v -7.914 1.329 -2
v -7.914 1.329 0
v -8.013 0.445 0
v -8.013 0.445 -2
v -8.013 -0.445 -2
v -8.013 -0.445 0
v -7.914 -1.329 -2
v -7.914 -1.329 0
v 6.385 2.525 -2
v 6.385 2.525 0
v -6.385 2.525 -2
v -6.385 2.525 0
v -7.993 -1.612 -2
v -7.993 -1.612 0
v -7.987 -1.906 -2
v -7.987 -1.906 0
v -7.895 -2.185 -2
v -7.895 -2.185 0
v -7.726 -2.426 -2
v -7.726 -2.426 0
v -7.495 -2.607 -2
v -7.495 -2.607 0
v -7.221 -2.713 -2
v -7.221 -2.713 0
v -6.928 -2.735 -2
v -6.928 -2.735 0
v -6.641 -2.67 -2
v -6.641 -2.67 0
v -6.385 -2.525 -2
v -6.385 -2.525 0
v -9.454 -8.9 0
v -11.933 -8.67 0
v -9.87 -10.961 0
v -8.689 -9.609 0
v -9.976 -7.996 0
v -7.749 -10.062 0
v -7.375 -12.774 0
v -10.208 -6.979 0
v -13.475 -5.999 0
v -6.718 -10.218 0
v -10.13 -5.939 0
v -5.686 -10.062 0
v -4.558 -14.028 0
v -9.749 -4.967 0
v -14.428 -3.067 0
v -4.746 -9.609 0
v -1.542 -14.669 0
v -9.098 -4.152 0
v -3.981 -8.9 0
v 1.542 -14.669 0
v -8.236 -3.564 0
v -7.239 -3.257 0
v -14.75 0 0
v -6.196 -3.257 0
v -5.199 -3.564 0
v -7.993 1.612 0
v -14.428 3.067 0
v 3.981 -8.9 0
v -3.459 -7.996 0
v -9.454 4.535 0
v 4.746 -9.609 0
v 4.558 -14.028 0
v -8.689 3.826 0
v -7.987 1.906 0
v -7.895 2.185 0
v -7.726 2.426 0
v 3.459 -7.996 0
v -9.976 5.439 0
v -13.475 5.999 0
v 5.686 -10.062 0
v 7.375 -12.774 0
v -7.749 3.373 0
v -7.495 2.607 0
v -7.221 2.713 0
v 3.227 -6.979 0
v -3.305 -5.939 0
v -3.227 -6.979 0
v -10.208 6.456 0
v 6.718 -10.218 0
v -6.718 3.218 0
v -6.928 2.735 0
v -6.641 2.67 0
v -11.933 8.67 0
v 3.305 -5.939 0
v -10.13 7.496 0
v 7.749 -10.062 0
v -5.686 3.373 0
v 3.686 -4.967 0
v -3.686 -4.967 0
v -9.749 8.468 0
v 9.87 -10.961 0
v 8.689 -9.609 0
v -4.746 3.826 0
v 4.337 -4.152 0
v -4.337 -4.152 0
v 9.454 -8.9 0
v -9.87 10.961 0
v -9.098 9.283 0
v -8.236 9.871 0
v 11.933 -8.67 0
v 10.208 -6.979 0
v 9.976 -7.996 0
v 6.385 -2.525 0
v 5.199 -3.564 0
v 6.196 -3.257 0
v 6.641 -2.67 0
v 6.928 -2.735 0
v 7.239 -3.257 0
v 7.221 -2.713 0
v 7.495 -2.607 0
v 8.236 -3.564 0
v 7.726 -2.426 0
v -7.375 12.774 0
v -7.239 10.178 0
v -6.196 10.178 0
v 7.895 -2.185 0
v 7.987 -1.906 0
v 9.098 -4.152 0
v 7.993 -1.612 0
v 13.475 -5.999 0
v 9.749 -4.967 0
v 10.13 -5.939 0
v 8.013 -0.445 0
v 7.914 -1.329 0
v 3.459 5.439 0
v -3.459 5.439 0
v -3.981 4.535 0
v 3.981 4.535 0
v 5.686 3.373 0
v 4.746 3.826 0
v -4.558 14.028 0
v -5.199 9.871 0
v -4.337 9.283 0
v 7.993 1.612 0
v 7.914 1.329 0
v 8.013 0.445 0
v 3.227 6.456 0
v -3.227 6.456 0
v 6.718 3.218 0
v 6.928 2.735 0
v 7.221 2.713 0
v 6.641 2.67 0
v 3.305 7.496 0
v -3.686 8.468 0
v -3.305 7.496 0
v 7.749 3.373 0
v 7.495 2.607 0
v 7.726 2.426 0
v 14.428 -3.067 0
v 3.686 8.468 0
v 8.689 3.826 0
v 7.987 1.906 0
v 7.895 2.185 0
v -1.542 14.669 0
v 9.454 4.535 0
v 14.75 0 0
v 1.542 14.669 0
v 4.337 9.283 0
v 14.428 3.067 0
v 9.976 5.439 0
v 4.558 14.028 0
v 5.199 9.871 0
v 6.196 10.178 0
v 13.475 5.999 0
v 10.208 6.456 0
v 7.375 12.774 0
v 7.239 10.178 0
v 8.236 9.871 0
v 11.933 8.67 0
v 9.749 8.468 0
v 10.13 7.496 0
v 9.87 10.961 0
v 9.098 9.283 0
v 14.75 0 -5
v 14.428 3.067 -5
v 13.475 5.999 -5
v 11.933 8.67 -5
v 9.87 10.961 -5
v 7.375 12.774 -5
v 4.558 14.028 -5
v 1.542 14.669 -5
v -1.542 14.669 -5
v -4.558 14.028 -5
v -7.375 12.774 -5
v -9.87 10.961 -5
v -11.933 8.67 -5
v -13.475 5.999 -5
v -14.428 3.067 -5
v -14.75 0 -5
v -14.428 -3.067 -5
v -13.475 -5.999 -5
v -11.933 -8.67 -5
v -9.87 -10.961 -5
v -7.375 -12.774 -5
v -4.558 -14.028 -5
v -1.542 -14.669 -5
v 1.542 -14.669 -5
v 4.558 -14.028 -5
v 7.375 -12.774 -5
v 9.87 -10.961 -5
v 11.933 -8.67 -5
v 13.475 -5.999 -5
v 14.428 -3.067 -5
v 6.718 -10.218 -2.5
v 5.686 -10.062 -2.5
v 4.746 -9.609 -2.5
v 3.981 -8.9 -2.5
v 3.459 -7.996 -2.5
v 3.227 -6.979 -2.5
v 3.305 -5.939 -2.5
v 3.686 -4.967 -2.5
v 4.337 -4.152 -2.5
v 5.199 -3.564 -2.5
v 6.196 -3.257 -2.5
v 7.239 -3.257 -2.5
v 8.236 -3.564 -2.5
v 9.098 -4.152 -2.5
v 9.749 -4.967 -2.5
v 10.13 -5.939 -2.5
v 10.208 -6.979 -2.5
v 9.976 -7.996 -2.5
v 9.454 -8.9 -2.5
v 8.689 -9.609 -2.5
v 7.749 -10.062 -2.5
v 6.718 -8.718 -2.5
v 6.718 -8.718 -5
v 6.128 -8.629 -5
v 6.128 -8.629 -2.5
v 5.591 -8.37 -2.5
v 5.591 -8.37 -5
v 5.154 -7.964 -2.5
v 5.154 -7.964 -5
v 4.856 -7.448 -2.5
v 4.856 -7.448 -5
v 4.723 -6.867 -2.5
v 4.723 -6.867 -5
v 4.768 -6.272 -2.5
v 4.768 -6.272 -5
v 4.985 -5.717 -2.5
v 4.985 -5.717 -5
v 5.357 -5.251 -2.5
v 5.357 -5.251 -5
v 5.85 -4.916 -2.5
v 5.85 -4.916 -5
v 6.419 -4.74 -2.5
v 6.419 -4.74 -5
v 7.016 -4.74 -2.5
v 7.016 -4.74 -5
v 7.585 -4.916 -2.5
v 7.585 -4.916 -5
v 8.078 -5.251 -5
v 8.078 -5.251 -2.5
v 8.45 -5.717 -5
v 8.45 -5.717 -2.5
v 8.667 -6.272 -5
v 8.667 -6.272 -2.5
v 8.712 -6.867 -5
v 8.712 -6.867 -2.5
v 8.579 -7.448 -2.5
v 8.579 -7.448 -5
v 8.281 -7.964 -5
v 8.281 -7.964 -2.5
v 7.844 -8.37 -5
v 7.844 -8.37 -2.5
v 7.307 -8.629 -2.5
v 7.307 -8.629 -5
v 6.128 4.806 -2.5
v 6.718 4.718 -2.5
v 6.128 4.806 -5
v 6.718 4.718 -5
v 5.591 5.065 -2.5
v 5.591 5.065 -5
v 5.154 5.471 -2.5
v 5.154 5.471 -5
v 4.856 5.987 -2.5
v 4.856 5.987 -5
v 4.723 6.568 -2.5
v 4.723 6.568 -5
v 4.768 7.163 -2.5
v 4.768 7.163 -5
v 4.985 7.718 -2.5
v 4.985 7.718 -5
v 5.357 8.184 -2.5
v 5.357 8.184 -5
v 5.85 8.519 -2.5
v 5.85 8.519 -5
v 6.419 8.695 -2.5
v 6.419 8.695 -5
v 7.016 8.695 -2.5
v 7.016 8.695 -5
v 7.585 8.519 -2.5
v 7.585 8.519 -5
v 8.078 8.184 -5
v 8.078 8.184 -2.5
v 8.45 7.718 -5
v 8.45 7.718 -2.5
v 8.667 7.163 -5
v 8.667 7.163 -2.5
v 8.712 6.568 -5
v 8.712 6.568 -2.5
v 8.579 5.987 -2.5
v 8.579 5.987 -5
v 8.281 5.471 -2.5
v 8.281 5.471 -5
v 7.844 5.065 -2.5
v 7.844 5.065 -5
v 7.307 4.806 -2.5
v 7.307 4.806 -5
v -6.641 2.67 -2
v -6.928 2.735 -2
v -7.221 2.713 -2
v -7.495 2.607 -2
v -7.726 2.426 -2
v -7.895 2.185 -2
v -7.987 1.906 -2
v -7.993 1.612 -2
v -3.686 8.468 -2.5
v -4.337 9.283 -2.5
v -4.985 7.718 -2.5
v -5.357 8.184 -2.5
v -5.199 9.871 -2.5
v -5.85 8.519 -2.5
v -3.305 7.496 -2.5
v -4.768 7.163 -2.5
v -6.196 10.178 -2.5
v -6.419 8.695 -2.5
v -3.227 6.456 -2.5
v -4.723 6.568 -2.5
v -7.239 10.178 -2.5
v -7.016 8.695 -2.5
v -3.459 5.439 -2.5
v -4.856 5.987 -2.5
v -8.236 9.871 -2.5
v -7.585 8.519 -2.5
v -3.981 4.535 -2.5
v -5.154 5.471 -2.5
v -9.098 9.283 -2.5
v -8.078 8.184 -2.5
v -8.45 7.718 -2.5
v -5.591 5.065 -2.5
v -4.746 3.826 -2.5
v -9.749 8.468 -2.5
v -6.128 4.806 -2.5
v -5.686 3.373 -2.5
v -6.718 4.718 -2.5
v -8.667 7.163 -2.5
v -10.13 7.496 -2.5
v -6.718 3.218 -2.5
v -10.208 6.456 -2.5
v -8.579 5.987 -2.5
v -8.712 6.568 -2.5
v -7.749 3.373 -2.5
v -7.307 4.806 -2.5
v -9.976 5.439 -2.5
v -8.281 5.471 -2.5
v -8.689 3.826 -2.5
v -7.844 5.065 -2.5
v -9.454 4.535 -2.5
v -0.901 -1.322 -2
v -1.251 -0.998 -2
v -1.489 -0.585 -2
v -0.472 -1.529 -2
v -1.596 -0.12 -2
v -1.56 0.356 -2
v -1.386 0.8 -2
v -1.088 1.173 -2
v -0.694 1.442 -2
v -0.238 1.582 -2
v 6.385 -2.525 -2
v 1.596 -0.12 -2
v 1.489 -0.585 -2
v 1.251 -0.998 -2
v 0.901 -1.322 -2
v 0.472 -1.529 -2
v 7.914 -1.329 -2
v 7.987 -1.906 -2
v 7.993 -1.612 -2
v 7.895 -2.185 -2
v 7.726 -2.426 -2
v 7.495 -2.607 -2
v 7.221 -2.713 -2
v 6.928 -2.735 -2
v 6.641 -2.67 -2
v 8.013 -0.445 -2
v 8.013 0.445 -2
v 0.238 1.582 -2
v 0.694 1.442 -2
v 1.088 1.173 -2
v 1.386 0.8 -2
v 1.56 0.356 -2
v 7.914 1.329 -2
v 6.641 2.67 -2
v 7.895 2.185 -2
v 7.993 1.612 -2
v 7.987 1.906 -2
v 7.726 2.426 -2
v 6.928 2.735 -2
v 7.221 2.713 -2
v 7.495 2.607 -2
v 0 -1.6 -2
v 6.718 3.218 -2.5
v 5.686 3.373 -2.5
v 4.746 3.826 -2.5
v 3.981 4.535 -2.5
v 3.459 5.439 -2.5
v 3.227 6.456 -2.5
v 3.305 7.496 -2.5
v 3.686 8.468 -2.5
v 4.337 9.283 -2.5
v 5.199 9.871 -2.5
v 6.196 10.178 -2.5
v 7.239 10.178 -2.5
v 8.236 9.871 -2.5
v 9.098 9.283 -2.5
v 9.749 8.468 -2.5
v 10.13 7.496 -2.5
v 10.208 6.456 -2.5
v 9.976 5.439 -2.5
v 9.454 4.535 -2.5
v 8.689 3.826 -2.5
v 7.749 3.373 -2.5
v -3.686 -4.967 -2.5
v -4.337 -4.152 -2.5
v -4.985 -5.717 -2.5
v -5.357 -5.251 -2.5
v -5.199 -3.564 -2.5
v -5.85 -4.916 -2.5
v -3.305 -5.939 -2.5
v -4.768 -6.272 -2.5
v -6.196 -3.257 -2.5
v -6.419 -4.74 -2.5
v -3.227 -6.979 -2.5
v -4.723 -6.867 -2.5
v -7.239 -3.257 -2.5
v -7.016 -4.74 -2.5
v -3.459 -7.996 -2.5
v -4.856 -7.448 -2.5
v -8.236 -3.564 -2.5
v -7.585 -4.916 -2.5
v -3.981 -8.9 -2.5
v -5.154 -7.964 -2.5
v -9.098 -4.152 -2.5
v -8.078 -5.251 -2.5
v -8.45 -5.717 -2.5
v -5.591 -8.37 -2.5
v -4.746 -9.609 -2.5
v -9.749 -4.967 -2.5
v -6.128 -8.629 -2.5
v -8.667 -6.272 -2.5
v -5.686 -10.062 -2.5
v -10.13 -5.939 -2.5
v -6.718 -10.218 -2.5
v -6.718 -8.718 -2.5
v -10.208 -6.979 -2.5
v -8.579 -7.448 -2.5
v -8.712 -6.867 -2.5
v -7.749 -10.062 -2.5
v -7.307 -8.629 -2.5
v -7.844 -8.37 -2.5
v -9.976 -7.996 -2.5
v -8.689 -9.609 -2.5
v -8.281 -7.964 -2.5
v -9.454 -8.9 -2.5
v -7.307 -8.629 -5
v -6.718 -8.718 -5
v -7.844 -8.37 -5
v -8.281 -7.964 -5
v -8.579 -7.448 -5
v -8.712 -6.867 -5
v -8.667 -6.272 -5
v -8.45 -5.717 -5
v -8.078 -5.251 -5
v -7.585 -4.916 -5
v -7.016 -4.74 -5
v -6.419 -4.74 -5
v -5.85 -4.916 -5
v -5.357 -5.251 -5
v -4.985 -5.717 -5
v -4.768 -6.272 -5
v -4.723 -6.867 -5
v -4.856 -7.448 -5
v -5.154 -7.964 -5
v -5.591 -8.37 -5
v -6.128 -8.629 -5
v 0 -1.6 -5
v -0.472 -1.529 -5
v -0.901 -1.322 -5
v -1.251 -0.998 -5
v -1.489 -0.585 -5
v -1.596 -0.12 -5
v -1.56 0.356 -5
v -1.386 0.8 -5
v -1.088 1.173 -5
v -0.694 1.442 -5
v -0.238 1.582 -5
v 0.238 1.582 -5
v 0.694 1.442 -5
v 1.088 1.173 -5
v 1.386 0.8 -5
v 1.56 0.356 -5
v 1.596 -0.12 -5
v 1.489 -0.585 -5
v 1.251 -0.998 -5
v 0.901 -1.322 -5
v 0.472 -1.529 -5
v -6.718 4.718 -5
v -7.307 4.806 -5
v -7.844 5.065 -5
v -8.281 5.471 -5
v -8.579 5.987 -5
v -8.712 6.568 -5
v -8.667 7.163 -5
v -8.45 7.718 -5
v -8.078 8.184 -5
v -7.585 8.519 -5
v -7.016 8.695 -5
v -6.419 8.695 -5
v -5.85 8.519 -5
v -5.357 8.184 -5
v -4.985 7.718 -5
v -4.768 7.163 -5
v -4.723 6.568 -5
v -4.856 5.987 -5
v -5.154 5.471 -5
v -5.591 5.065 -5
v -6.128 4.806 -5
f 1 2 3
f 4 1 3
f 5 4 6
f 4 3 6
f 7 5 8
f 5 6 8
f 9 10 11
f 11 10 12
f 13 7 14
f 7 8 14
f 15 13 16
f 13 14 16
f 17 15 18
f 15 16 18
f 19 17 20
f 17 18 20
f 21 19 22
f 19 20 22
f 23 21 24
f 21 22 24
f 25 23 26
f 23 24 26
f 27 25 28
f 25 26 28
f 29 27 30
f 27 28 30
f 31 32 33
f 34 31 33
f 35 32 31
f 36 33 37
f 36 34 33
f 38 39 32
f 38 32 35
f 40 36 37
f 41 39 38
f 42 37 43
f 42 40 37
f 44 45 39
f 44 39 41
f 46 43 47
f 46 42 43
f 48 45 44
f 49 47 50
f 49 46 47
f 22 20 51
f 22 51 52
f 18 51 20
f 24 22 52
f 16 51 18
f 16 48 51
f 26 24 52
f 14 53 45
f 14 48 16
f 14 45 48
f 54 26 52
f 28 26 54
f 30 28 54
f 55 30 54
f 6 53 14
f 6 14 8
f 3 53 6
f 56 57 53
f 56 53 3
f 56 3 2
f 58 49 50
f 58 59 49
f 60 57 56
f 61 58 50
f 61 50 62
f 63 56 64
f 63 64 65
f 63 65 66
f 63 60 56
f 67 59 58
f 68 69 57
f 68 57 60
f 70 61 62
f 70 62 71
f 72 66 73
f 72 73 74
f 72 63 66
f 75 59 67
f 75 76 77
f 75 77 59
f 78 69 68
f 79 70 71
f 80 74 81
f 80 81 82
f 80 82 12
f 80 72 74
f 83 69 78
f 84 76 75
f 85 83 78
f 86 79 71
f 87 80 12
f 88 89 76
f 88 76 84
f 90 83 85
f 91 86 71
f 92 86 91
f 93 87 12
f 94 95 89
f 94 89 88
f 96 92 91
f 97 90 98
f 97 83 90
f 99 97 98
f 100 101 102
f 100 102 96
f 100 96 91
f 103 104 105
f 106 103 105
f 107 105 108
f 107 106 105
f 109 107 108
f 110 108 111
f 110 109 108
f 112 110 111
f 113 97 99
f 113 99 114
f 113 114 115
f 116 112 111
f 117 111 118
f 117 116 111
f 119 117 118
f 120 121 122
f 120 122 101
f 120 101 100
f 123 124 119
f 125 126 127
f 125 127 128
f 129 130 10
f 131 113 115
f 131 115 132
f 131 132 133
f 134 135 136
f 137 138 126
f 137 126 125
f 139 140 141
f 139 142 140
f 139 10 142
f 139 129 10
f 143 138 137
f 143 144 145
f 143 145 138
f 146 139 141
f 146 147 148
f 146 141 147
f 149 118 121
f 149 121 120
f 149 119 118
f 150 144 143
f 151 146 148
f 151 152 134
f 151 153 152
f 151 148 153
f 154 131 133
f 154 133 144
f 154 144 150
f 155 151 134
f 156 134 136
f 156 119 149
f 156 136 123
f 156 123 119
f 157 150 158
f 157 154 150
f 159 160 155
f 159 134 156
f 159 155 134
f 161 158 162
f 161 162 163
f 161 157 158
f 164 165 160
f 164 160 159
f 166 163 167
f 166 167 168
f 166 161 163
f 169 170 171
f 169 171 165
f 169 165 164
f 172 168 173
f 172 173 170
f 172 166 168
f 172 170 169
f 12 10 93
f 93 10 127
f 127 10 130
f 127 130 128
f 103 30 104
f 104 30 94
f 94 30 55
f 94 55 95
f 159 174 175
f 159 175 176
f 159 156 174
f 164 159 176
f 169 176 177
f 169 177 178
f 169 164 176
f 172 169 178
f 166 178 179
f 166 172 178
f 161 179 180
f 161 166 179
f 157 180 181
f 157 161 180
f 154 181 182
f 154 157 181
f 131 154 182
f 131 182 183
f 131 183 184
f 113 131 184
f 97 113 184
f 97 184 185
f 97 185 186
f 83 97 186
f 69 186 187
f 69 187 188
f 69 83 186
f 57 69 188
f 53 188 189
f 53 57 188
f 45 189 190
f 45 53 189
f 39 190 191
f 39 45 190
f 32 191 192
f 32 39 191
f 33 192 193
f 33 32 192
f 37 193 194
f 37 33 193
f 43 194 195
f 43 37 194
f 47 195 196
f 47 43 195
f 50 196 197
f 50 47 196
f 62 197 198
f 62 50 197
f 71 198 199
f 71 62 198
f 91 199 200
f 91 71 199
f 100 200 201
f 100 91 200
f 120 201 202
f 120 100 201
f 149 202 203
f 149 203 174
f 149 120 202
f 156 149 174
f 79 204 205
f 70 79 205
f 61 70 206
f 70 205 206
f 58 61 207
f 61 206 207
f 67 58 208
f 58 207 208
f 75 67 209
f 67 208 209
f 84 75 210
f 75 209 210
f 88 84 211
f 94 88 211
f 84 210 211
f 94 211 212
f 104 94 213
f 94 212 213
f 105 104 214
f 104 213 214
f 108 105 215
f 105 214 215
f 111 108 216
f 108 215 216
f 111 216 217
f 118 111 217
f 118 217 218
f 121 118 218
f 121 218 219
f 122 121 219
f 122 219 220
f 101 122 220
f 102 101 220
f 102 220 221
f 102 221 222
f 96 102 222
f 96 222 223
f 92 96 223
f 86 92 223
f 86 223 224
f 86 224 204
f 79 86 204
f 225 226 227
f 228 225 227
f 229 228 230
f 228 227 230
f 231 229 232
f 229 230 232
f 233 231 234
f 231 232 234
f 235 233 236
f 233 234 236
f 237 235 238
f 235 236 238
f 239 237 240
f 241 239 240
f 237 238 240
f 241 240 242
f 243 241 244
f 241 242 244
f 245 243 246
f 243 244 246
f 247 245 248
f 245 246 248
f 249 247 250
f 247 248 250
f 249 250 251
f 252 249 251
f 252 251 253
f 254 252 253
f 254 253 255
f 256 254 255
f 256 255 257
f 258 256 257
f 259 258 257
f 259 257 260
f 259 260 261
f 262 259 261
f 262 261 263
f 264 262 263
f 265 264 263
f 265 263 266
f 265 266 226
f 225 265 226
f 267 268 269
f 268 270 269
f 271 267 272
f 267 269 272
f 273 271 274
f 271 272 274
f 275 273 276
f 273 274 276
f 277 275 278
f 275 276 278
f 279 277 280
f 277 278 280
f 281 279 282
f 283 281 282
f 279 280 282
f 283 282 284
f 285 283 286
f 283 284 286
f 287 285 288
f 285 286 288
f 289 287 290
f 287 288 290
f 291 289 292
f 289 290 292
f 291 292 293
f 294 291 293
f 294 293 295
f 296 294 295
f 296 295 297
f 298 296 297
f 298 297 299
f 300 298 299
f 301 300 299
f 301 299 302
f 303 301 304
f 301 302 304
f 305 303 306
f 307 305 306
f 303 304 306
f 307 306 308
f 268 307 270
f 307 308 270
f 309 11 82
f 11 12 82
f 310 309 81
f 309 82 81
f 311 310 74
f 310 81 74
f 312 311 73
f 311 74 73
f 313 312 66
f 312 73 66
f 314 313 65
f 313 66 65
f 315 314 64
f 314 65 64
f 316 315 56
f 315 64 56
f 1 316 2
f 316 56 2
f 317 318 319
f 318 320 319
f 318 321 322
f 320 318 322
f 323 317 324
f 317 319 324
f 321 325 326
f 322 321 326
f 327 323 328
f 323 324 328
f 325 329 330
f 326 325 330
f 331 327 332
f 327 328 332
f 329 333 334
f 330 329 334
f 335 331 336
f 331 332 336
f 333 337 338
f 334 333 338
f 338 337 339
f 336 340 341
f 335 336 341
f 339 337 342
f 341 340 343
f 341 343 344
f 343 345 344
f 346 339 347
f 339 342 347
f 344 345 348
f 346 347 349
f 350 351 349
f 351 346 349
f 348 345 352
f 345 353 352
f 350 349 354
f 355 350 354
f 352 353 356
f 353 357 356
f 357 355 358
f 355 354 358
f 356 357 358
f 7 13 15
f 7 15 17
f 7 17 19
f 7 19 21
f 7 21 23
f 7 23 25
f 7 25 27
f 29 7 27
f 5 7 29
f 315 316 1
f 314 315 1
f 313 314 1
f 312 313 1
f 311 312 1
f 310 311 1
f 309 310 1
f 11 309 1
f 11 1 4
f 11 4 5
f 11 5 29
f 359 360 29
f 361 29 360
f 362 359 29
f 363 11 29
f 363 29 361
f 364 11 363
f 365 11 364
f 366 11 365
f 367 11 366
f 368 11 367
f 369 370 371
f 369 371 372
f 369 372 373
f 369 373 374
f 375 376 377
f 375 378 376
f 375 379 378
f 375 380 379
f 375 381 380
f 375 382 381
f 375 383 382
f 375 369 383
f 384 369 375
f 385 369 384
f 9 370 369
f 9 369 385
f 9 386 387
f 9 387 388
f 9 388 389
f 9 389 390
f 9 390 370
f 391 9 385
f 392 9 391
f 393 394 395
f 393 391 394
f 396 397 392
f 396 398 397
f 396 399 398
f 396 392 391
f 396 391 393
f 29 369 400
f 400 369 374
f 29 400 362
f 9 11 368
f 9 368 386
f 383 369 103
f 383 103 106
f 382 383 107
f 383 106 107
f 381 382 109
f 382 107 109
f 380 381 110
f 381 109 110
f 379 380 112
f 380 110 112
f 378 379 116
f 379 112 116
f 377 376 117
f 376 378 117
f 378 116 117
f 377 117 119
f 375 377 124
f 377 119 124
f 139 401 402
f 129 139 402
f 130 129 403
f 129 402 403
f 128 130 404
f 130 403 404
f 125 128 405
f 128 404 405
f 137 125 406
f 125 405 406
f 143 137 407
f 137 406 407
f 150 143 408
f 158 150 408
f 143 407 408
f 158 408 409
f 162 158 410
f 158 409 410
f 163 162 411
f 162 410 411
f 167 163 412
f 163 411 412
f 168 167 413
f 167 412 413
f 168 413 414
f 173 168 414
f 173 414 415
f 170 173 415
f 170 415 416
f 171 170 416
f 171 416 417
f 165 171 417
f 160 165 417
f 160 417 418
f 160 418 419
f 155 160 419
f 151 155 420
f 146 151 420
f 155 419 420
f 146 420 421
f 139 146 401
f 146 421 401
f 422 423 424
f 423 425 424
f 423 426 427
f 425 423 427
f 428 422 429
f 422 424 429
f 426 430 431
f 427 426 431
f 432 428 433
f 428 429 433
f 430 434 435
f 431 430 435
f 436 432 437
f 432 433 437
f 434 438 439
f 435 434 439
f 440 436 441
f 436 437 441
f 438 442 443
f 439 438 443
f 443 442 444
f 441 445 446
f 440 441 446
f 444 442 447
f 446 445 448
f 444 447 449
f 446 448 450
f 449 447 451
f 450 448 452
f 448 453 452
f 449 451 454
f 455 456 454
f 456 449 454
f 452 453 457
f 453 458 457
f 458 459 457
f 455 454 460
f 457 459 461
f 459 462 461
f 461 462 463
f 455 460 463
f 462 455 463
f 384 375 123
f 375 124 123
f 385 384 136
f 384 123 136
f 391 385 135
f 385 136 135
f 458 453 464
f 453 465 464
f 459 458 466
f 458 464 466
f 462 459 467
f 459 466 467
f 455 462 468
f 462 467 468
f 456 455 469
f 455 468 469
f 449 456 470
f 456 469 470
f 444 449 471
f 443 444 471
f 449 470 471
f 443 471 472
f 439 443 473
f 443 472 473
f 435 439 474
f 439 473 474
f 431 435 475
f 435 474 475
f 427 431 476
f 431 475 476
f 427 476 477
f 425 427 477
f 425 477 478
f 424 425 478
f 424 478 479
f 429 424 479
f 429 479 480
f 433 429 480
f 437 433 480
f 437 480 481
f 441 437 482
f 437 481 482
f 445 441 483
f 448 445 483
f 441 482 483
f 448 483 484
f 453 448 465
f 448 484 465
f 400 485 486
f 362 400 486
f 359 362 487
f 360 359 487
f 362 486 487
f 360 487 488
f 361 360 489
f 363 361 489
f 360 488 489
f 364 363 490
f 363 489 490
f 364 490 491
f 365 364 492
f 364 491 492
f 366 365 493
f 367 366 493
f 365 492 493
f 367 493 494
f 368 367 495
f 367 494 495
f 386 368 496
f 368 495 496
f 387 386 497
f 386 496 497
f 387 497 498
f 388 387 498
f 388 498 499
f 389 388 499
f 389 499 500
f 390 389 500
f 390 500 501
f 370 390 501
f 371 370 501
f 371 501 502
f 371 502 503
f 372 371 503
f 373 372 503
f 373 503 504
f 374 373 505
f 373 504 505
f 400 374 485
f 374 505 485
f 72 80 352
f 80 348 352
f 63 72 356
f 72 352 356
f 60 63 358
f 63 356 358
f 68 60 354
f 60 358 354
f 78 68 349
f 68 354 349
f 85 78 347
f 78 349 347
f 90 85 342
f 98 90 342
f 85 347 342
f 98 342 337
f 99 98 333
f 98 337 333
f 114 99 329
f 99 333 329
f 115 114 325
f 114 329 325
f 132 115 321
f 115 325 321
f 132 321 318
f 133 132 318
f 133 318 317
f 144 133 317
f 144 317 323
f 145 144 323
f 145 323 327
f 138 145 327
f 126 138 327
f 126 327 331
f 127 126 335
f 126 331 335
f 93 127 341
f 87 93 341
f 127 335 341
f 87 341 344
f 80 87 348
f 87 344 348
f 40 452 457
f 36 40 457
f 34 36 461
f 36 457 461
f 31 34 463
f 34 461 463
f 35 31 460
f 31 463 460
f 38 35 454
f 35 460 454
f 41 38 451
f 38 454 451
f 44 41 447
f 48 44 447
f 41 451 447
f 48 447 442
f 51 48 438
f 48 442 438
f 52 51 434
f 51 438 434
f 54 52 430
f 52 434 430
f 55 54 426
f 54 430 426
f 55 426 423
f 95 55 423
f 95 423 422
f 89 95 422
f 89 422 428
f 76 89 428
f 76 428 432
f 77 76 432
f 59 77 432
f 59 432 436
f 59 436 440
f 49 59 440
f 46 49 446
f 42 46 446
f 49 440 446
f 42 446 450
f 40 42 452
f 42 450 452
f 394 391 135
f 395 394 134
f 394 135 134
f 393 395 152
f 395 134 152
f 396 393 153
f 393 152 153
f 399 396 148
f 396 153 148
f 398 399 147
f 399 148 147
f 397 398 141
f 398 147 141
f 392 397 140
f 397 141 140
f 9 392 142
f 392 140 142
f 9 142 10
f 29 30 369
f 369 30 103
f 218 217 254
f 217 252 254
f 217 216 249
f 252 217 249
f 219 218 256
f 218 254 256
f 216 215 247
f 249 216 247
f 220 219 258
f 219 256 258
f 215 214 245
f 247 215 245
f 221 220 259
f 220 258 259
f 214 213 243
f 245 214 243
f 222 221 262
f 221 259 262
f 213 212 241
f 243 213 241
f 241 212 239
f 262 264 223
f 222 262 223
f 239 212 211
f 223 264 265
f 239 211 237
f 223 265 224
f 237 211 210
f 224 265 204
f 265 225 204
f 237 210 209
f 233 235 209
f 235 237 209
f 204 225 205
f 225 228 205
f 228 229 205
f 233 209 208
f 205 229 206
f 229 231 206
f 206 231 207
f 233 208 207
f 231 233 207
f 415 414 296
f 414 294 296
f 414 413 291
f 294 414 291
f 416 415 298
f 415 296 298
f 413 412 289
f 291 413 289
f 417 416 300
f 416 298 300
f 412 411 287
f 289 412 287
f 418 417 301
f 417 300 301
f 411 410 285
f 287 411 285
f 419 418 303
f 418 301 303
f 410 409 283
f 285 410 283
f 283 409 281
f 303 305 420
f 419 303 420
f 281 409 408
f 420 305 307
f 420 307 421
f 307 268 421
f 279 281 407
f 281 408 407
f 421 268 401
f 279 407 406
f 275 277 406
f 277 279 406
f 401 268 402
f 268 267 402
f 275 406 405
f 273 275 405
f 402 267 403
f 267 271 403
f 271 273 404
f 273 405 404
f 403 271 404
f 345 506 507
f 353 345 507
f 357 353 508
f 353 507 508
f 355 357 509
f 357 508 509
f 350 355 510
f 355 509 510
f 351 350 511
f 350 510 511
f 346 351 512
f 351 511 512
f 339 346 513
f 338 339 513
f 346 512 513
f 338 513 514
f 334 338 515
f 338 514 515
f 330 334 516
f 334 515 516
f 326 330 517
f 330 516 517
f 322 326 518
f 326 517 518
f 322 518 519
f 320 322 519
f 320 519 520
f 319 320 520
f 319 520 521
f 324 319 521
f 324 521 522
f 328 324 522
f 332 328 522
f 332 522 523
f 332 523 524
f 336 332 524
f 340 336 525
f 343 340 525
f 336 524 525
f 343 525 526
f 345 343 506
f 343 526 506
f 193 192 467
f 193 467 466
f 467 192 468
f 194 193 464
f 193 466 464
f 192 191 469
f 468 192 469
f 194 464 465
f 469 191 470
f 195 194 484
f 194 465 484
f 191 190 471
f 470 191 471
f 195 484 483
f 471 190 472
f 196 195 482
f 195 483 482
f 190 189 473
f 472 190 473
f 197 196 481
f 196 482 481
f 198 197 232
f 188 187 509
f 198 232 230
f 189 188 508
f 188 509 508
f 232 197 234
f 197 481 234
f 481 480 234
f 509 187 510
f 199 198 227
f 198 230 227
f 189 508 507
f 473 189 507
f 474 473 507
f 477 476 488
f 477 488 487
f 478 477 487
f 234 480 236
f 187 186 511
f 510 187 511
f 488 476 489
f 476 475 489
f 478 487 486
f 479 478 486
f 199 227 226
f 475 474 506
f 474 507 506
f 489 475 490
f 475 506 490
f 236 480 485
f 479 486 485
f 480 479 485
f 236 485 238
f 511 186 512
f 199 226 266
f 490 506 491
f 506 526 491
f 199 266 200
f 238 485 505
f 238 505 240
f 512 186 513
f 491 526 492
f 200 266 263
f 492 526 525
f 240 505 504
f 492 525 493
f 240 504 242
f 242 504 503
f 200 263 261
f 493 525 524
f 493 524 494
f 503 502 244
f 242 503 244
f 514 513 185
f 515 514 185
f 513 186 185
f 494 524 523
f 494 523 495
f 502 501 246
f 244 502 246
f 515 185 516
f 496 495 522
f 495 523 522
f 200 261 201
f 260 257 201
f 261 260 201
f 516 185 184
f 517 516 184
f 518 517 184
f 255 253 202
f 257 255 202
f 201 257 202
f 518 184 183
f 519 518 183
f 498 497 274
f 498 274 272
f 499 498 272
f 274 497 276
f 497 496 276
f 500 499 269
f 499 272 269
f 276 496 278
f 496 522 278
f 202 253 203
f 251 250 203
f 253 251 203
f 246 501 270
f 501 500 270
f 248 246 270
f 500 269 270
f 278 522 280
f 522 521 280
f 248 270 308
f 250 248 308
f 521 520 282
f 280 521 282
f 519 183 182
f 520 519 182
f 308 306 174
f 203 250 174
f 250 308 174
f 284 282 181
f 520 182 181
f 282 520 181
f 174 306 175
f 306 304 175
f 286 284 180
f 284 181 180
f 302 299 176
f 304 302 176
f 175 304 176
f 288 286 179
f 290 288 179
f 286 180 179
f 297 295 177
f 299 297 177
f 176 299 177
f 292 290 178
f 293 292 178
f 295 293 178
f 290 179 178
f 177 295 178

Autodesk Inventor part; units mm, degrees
ref_plane "YZ Plane" through (0, 0, 0) normal (1, 0, 0) x (0, 1, 0)
ref_plane "XZ Plane" through (0, 0, 0) normal (0, 1, 0) x (-1, 0, 0)
ref_plane "XY Plane" through (0, 0, 0) normal (0, 0, 1) x (1, 0, 0)
sketch "Sketch1" plane through (0, 0, 0) normal (0, 0, 1) x (1, 0, 0)
  circle A0 centre (0, 0) radius 14.75
  circle A1 centre (0, 0) radius 8 construction
  line L0 (-14.75, 0) -> (14.75, 0) construction
  line L1 (-7.5993, -2.5) -> (7.5993, -2.5) construction
  line L2 (-7.5993, 2.5) -> (7.5993, 2.5) construction
  circle A2 centre (0, 0) radius 12.5 construction
  circle A3 centre (0, 0) radius 6.5 construction
  circle A4 centre (0, 0) radius 9.5 construction
  line L3 (0, 0) -> (6.7175, 6.7175) construction
  line L4 (0, -14.75) -> (0, 14.75) construction
  circle A5 centre (0, 0) radius 10.25 construction
  circle A6 centre (0, 10.25) radius 2.75 construction
  circle A7 centre (0, 10.25) radius 3.25 construction
  circle A8 centre (6.7175, 6.7175) radius 2 construction
  circle A9 centre (6.7175, 6.7175) radius 2 construction
  line L5 (-7.6174, -2.525) -> (7.6174, -2.525)
  arc A10 (7.6174, -2.525) -> (7.6174, 2.525) centre (0, 0) ccw
  line L6 (7.6174, 2.525) -> (-7.6174, 2.525)
  arc A11 (-7.6174, 2.525) -> (-7.6174, -2.525) centre (0, 0) ccw
  arc A12 (7.9142, 1.3291) -> (6.3852, 2.525) centre (7.0013, 1.7373) ccw
  arc A13 (6.3852, -2.525) -> (7.9142, -1.3291) centre (7.0013, -1.7373) ccw
  arc A14 (-6.3852, 2.525) -> (-7.9142, 1.3291) centre (-7.0013, 1.7373) ccw
  arc A15 (-7.9142, -1.3291) -> (-6.3852, -2.525) centre (-7.0013, -1.7373) ccw
  circle A16 centre (0, 10.25) radius 1.75 construction
  circle A17 centre (6.7175, 6.7175) radius 3.25 construction
  point P0 (-6.7175, 6.7175)
  point P1 (-6.7175, -6.7175)
  point P2 (6.7175, -6.7175)
  point P3 (-7.9142, 1.3291)
  point P4 (-7.9142, -1.3291)
  point P5 (-6.3852, -2.525)
  point P6 (6.3852, -2.525)
  point P7 (7.9142, -1.3291)
  point P8 (-6.3852, 2.525)
  point P9 (-10.25, 0)
  point P10 (0, -10.25)
  point P11 (10.25, 0)
  dimension "d1" = 16
  dimension "d2" = 5
  dimension "d3" = 25
  dimension "d4" = 29.5
  dimension "d7" = 45
  dimension "d11" = 360
  dimension "d36" = 5.5
  dimension "d37" = 0.5
  dimension "d39" = 4
  dimension "d40" = 0
  dimension "d41" = 0.025
  dimension "d42" = 0.025
  dimension "d43" = 1
  dimension "d47" = 3.5
  dimension "d48" = 0.5
  dimension "d49" = 1
  dimension "d52" = 360
  dimension "d56" = 1
  dimension "d57" = 6.5
extrude "Extrusion1" add sketch "Sketch1" against normal blind 5 contours A0 | A11 L6 A10 L5 | A15 A11 | L5 A15 | L5 A13 | A14 A11 | A10 A13 | A14 L6 | A10 A12 | A12 L6
hole "Hole1" at (0, 0, 0) direction (0, 0, -1) diameter 3.2 end through all
hole "Hole2" [suppressed]
hole "Hole3" at (6.7175, 6.7175, 0) at (-6.7175, 6.7175, 0) at (-6.7175, -6.7175, 0) at (6.7175, -6.7175, 0) direction (0, 0, -1) diameter 4 end through all counterbore diameter 7 counterbore depth 2.5
extrude "Extrusion2" cut sketch "Sketch1" against normal blind 2 contours A11 L6 A10 L5 | A15 A11 | L5 A15 | L5 A13 | A14 A11 | A10 A13 | A14 L6 | A10 A12 | A12 L6
equation "\"d42\" = d41"
properties part number "CrossRollerBearingInnerFlange" material "Aluminum 7075"
